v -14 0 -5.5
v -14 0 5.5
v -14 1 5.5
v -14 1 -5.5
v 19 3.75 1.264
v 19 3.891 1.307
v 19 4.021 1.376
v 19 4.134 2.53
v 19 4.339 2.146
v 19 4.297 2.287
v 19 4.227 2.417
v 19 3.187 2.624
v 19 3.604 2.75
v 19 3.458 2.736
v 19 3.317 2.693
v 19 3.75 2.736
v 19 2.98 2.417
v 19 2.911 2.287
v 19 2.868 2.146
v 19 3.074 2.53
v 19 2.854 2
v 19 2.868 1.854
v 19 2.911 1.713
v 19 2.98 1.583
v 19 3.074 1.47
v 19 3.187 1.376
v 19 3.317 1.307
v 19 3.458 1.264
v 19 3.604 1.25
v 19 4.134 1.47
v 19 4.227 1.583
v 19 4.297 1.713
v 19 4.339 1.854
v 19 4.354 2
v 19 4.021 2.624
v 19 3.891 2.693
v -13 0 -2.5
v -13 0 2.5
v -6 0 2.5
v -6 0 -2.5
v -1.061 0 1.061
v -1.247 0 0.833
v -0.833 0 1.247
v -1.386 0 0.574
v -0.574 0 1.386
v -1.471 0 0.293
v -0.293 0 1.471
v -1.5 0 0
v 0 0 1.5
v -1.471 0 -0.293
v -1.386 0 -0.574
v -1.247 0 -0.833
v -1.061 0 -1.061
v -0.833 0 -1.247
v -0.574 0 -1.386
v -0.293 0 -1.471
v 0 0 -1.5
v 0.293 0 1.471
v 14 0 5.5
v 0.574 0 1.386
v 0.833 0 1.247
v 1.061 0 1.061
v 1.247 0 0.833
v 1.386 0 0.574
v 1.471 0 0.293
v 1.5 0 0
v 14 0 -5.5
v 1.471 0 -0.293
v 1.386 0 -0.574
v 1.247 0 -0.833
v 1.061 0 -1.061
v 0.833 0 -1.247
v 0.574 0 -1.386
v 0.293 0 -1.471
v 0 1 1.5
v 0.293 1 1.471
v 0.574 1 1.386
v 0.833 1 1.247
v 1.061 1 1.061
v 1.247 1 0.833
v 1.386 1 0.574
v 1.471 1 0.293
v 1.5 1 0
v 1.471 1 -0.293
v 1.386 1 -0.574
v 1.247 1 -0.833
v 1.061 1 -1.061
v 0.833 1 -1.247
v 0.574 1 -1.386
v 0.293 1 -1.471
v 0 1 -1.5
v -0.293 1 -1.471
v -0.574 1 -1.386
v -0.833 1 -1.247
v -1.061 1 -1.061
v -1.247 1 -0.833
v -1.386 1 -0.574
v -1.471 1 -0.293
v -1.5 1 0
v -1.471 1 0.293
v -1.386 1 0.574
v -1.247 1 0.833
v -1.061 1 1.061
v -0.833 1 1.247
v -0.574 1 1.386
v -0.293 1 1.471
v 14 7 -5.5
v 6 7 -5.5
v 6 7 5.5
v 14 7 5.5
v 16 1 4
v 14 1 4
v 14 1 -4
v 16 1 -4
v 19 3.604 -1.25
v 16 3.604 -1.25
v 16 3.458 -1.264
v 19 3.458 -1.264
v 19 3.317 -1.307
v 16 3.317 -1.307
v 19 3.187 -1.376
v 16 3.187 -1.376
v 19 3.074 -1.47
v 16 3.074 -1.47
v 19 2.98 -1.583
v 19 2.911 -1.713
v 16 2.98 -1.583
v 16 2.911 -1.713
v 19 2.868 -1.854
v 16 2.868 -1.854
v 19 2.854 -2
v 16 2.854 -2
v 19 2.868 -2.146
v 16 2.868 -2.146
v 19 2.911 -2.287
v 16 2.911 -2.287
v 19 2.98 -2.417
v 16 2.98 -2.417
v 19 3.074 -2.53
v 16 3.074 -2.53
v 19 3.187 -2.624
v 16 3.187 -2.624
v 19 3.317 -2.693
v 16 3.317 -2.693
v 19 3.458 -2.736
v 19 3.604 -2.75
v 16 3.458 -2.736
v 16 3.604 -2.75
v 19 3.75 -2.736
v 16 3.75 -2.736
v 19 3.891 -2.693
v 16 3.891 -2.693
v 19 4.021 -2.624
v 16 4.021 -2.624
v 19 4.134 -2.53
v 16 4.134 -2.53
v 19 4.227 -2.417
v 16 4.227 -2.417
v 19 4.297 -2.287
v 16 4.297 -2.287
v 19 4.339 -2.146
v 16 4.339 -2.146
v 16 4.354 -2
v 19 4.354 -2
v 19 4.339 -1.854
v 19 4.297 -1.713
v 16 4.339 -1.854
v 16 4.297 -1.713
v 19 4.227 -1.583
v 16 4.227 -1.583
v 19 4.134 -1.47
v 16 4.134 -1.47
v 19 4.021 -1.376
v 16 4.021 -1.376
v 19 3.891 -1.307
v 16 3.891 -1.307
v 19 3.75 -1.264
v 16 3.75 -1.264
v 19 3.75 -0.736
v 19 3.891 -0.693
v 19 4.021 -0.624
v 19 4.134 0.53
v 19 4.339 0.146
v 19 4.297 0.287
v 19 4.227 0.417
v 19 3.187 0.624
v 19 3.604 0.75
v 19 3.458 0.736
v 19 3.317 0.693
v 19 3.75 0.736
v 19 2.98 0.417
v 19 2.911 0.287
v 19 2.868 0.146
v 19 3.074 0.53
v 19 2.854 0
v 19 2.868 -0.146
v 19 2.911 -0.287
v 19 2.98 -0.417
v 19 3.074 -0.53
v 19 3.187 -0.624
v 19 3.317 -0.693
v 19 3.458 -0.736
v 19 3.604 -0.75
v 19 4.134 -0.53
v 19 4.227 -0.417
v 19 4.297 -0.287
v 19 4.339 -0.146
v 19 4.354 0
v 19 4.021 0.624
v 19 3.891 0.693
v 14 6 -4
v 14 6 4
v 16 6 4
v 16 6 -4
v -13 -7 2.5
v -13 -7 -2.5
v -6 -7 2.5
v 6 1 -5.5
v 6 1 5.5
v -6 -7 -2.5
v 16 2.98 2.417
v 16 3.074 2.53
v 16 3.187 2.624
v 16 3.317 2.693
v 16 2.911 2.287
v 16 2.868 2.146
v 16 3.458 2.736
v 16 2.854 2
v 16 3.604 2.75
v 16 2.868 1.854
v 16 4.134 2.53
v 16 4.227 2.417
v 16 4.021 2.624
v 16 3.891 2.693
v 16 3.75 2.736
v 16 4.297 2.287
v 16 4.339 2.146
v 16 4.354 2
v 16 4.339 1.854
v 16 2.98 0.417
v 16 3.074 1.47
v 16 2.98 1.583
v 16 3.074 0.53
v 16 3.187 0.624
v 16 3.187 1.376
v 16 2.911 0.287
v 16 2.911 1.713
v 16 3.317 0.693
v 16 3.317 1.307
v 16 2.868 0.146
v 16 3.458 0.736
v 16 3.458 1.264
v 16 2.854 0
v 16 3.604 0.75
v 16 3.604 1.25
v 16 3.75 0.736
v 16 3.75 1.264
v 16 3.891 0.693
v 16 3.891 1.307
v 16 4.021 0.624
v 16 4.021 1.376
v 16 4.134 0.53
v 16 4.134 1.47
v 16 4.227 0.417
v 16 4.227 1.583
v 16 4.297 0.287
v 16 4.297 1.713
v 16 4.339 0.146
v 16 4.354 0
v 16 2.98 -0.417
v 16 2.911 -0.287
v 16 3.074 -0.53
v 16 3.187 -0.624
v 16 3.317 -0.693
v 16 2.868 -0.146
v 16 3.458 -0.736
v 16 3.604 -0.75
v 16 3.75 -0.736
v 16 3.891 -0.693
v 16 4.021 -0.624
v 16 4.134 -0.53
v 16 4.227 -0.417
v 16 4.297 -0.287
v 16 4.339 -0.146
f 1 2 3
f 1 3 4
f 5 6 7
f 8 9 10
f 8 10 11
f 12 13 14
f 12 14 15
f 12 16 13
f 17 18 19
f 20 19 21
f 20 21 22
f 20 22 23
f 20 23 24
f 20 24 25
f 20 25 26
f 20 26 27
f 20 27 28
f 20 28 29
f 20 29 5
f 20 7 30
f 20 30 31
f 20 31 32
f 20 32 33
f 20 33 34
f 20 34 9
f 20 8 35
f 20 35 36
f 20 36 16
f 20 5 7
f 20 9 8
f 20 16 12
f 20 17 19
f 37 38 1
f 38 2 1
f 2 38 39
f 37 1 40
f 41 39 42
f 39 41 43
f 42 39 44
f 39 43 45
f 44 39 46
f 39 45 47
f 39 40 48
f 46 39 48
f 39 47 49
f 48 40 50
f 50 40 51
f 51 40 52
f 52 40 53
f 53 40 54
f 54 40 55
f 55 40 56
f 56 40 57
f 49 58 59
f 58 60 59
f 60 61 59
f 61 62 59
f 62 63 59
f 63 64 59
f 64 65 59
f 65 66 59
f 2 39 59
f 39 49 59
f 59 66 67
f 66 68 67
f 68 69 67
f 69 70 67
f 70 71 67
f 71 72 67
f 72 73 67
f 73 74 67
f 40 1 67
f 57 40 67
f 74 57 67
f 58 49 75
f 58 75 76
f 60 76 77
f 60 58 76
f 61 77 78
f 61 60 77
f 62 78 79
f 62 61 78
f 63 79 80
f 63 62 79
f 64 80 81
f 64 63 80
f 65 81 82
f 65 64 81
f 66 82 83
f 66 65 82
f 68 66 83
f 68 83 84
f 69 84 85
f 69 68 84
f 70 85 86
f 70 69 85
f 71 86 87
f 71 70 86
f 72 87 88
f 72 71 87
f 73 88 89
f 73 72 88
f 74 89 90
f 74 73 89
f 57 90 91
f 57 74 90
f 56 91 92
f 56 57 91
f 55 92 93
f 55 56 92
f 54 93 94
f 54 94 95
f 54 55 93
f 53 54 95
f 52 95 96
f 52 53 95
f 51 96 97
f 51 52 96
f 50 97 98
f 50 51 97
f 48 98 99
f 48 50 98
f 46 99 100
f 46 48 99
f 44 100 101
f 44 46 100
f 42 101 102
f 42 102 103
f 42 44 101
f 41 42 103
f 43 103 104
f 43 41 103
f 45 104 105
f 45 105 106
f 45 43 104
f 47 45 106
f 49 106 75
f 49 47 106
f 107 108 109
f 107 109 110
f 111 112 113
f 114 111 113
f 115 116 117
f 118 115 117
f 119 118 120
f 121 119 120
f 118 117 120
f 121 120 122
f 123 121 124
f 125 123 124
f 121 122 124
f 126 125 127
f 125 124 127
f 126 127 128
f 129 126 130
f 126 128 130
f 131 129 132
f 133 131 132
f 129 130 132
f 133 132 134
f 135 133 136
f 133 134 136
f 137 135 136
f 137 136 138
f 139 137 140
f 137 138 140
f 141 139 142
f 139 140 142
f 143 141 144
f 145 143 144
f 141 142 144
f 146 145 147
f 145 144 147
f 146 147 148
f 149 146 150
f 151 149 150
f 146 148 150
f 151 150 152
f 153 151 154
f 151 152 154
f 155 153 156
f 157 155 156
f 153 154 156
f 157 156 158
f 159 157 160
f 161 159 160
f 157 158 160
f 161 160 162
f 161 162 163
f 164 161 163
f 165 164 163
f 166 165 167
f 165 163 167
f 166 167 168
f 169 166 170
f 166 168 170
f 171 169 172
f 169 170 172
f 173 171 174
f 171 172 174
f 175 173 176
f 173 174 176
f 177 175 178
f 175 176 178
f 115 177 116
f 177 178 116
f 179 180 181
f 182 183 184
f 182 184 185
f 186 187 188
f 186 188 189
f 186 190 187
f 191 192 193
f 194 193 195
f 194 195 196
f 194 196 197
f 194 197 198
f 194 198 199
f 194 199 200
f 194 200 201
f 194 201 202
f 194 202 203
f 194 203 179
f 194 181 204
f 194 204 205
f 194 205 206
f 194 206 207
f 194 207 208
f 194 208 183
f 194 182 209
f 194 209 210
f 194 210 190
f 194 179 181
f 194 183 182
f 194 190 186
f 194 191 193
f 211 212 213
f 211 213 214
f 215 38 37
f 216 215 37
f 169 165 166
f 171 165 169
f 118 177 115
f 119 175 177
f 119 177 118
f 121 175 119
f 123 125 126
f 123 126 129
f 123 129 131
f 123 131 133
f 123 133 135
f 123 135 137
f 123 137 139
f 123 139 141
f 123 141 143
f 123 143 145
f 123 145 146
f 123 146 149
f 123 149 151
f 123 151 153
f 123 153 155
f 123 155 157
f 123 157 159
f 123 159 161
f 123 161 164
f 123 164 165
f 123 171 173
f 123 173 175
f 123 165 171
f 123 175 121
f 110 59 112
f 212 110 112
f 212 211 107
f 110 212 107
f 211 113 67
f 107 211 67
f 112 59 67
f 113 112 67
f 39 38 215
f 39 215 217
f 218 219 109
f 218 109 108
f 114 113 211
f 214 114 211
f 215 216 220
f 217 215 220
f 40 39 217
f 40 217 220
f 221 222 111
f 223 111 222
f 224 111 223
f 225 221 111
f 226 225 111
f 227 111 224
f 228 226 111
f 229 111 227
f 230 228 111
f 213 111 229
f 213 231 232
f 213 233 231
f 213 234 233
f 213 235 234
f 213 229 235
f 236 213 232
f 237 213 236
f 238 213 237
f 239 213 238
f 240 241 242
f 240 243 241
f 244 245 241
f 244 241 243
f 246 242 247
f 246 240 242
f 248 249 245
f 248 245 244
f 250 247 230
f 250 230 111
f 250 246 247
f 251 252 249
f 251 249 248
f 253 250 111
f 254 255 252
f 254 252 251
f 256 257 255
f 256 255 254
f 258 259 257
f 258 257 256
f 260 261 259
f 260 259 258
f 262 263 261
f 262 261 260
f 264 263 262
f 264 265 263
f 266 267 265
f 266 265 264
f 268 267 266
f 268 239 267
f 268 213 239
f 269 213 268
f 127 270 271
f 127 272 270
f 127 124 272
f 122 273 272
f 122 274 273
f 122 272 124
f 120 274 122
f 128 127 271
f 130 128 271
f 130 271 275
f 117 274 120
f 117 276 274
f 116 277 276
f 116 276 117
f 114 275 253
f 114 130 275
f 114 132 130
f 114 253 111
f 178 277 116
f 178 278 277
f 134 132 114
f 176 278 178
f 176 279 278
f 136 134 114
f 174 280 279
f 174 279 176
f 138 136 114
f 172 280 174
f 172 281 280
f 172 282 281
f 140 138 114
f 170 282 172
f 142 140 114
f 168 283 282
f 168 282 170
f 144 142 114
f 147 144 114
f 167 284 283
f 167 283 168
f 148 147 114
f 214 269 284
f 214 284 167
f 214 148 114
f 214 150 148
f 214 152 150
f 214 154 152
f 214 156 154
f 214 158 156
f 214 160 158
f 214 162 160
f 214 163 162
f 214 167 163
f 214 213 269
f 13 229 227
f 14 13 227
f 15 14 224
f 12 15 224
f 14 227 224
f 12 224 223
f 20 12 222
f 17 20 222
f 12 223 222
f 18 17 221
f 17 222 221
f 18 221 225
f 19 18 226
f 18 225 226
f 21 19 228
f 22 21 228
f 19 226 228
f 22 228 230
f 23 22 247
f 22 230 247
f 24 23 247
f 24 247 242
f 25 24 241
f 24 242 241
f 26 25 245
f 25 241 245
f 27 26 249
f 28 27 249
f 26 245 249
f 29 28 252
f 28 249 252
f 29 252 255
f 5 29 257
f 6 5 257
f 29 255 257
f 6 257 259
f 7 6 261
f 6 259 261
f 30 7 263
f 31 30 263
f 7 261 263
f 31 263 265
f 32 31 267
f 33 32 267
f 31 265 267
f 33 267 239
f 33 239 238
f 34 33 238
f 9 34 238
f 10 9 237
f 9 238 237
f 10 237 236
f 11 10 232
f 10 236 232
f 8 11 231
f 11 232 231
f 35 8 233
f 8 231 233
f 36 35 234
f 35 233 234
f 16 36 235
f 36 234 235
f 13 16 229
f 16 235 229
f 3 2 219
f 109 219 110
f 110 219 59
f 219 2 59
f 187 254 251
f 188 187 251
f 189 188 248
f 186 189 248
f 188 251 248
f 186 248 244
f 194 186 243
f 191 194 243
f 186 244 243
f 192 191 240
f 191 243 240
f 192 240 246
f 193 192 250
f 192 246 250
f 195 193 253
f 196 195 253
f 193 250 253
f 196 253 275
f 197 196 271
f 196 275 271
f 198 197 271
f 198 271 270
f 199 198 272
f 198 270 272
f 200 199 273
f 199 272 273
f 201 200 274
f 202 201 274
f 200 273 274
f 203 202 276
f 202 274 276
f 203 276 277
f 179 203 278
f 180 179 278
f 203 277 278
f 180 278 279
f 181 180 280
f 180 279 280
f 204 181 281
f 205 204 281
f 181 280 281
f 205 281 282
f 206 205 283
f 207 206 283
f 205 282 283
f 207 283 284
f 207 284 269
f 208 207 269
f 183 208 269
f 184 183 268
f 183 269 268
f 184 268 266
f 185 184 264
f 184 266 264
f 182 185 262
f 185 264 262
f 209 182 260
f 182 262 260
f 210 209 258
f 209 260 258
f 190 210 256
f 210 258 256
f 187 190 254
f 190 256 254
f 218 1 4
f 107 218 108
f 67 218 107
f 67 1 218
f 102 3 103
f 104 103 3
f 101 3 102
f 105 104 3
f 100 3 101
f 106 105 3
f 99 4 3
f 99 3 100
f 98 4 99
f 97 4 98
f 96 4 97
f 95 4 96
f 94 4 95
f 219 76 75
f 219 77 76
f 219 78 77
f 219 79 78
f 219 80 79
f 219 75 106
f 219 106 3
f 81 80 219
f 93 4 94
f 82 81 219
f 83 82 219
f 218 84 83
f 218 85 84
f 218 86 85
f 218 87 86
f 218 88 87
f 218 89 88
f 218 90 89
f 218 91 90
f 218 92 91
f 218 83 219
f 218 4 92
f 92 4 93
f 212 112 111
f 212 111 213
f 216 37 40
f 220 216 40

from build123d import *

# Parameters (mm, degrees)
SKETCH1_W           = 20
SKETCH1_H           = 11
SKETCH1_W_2         = 7
SKETCH1_H_2         = 5
SKETCH1_R           = 3.25
SKETCH1_R_2         = 1.5
SKETCH1_W_3         = 8
BOSS_EXTRUDE1_DEPTH = 1
SKETCH1_3_W         = 7
SKETCH1_3_H         = 5
BOSS_EXTRUDE2_DEPTH = 7
BOSS_EXTRUDE3_START = 1
SKETCH1_4_W         = 8
SKETCH1_4_H         = 11
BOSS_EXTRUDE3_DEPTH = 6
SKETCH3_W           = 8
SKETCH3_H           = 5
BOSS_EXTRUDE4_DEPTH = 2
SKETCH4_R           = 0.75
BOSS_EXTRUDE6_DEPTH = 3


with BuildPart() as part:
    # Sketch1 → Boss-Extrude1 (new body)
    # profile 1 of 4: a face of its own
    with BuildSketch(Plane(origin=(0, 0, 0), x_dir=(1, 0, 0), z_dir=(0, 1, 0))):
        with Locations((-4, 0)):
            Rectangle(SKETCH1_W, SKETCH1_H)
        with Locations((-9.5, 0)):
            Rectangle(SKETCH1_W_2, SKETCH1_H_2, mode=Mode.SUBTRACT)
        Circle(SKETCH1_R, mode=Mode.SUBTRACT)
    # profile 2 of 4: a face of its own
    with BuildSketch(Plane(origin=(0, 0, 0), x_dir=(1, 0, 0), z_dir=(0, 1, 0))):
        with Locations((-9.5, 0)):
            Rectangle(SKETCH1_W_2, SKETCH1_H_2)
    # profile 3 of 4: a face of its own
    with BuildSketch(Plane(origin=(0, 0, 0), x_dir=(1, 0, 0), z_dir=(0, 1, 0))):
        Circle(SKETCH1_R)
        with Locations(Location((0, 0, 0), (0, 0, 270))):
            Circle(SKETCH1_R_2, mode=Mode.SUBTRACT)
    # profile 4 of 4: a face of its own
    with BuildSketch(Plane(origin=(0, 0, 0), x_dir=(1, 0, 0), z_dir=(0, 1, 0))):
        with Locations((10, 0)):
            Rectangle(SKETCH1_W_3, SKETCH1_H)
    extrude(amount=BOSS_EXTRUDE1_DEPTH)

    # Sketch1<3> → Boss-Extrude2 (add)
    with BuildSketch(Plane(origin=(0, 0, 0), x_dir=(1, 0, 0), z_dir=(0, 1, 0))):
        with Locations((-9.5, 0)):
            Rectangle(SKETCH1_3_W, SKETCH1_3_H)
    extrude(amount=-BOSS_EXTRUDE2_DEPTH)

    # Sketch1<4> → Boss-Extrude3 (add)
    with BuildSketch(Plane(origin=(0, 0, 0), x_dir=(1, 0, 0), z_dir=(0, 1, 0)).offset(BOSS_EXTRUDE3_START)):
        with Locations((10, 0)):
            Rectangle(SKETCH1_4_W, SKETCH1_4_H)
    extrude(amount=BOSS_EXTRUDE3_DEPTH)

    # Sketch3 → Boss-Extrude4 (add)
    with BuildSketch(Plane(origin=(14, 0, 0), x_dir=(0, 0, -1), z_dir=(1, 0, 0))):
        with Locations((0, 3.5)):
            Rectangle(SKETCH3_W, SKETCH3_H)
    extrude(amount=BOSS_EXTRUDE4_DEPTH)

    # Sketch4 → Boss-Extrude6 (add)
    with BuildSketch(Plane(origin=(16, 0, 0), x_dir=(0, 0, -1), z_dir=(1, 0, 0))):
        with Locations(Location((-2, 3.603838689, 0), (0, 0, 180))):
            Circle(SKETCH4_R)
        with Locations(Location((0, 3.603838689, 0), (0, 0, 180))):
            Circle(SKETCH4_R)
        with Locations(Location((2, 3.603838689, 0), (0, 0, 180))):
            Circle(SKETCH4_R)
    extrude(amount=BOSS_EXTRUDE6_DEPTH)


solid = part.part
